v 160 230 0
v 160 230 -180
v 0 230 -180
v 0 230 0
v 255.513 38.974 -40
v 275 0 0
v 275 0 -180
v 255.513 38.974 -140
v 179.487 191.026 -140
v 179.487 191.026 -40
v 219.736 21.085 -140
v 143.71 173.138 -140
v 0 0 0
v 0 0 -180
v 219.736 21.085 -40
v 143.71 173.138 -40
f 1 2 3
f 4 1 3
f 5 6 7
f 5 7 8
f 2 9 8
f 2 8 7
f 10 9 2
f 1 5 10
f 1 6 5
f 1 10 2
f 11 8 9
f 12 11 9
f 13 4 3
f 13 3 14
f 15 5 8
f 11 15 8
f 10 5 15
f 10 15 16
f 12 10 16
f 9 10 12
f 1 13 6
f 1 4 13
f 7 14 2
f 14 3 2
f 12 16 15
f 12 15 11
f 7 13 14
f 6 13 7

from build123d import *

# Parameters (mm, degrees)
BOSS_EXTRUDE1_DEPTH = 180
SKETCH3_W           = 100
SKETCH3_H           = 170
CUT_EXTRUDE4_DEPTH  = 50


with BuildPart() as part:
    # Sketch1 → Boss-Extrude1 (new body)
    with BuildSketch(Plane.XY):
        Polygon((0, 0), (275, 0), (160, 230), (0, 230), align=None)
    extrude(amount=-BOSS_EXTRUDE1_DEPTH)

    # Sketch3 → Cut-Extrude4 (cut)
    with BuildSketch(Plane(origin=(228.94427191, 114.472135955, 0), x_dir=(0, 0, -1), z_dir=(0.894427191, 0.447213595, 0))):
        with Locations((90, 5.590169944)):
            Rectangle(SKETCH3_W, SKETCH3_H)
    extrude(amount=-CUT_EXTRUDE4_DEPTH, mode=Mode.SUBTRACT)


solid = part.part
